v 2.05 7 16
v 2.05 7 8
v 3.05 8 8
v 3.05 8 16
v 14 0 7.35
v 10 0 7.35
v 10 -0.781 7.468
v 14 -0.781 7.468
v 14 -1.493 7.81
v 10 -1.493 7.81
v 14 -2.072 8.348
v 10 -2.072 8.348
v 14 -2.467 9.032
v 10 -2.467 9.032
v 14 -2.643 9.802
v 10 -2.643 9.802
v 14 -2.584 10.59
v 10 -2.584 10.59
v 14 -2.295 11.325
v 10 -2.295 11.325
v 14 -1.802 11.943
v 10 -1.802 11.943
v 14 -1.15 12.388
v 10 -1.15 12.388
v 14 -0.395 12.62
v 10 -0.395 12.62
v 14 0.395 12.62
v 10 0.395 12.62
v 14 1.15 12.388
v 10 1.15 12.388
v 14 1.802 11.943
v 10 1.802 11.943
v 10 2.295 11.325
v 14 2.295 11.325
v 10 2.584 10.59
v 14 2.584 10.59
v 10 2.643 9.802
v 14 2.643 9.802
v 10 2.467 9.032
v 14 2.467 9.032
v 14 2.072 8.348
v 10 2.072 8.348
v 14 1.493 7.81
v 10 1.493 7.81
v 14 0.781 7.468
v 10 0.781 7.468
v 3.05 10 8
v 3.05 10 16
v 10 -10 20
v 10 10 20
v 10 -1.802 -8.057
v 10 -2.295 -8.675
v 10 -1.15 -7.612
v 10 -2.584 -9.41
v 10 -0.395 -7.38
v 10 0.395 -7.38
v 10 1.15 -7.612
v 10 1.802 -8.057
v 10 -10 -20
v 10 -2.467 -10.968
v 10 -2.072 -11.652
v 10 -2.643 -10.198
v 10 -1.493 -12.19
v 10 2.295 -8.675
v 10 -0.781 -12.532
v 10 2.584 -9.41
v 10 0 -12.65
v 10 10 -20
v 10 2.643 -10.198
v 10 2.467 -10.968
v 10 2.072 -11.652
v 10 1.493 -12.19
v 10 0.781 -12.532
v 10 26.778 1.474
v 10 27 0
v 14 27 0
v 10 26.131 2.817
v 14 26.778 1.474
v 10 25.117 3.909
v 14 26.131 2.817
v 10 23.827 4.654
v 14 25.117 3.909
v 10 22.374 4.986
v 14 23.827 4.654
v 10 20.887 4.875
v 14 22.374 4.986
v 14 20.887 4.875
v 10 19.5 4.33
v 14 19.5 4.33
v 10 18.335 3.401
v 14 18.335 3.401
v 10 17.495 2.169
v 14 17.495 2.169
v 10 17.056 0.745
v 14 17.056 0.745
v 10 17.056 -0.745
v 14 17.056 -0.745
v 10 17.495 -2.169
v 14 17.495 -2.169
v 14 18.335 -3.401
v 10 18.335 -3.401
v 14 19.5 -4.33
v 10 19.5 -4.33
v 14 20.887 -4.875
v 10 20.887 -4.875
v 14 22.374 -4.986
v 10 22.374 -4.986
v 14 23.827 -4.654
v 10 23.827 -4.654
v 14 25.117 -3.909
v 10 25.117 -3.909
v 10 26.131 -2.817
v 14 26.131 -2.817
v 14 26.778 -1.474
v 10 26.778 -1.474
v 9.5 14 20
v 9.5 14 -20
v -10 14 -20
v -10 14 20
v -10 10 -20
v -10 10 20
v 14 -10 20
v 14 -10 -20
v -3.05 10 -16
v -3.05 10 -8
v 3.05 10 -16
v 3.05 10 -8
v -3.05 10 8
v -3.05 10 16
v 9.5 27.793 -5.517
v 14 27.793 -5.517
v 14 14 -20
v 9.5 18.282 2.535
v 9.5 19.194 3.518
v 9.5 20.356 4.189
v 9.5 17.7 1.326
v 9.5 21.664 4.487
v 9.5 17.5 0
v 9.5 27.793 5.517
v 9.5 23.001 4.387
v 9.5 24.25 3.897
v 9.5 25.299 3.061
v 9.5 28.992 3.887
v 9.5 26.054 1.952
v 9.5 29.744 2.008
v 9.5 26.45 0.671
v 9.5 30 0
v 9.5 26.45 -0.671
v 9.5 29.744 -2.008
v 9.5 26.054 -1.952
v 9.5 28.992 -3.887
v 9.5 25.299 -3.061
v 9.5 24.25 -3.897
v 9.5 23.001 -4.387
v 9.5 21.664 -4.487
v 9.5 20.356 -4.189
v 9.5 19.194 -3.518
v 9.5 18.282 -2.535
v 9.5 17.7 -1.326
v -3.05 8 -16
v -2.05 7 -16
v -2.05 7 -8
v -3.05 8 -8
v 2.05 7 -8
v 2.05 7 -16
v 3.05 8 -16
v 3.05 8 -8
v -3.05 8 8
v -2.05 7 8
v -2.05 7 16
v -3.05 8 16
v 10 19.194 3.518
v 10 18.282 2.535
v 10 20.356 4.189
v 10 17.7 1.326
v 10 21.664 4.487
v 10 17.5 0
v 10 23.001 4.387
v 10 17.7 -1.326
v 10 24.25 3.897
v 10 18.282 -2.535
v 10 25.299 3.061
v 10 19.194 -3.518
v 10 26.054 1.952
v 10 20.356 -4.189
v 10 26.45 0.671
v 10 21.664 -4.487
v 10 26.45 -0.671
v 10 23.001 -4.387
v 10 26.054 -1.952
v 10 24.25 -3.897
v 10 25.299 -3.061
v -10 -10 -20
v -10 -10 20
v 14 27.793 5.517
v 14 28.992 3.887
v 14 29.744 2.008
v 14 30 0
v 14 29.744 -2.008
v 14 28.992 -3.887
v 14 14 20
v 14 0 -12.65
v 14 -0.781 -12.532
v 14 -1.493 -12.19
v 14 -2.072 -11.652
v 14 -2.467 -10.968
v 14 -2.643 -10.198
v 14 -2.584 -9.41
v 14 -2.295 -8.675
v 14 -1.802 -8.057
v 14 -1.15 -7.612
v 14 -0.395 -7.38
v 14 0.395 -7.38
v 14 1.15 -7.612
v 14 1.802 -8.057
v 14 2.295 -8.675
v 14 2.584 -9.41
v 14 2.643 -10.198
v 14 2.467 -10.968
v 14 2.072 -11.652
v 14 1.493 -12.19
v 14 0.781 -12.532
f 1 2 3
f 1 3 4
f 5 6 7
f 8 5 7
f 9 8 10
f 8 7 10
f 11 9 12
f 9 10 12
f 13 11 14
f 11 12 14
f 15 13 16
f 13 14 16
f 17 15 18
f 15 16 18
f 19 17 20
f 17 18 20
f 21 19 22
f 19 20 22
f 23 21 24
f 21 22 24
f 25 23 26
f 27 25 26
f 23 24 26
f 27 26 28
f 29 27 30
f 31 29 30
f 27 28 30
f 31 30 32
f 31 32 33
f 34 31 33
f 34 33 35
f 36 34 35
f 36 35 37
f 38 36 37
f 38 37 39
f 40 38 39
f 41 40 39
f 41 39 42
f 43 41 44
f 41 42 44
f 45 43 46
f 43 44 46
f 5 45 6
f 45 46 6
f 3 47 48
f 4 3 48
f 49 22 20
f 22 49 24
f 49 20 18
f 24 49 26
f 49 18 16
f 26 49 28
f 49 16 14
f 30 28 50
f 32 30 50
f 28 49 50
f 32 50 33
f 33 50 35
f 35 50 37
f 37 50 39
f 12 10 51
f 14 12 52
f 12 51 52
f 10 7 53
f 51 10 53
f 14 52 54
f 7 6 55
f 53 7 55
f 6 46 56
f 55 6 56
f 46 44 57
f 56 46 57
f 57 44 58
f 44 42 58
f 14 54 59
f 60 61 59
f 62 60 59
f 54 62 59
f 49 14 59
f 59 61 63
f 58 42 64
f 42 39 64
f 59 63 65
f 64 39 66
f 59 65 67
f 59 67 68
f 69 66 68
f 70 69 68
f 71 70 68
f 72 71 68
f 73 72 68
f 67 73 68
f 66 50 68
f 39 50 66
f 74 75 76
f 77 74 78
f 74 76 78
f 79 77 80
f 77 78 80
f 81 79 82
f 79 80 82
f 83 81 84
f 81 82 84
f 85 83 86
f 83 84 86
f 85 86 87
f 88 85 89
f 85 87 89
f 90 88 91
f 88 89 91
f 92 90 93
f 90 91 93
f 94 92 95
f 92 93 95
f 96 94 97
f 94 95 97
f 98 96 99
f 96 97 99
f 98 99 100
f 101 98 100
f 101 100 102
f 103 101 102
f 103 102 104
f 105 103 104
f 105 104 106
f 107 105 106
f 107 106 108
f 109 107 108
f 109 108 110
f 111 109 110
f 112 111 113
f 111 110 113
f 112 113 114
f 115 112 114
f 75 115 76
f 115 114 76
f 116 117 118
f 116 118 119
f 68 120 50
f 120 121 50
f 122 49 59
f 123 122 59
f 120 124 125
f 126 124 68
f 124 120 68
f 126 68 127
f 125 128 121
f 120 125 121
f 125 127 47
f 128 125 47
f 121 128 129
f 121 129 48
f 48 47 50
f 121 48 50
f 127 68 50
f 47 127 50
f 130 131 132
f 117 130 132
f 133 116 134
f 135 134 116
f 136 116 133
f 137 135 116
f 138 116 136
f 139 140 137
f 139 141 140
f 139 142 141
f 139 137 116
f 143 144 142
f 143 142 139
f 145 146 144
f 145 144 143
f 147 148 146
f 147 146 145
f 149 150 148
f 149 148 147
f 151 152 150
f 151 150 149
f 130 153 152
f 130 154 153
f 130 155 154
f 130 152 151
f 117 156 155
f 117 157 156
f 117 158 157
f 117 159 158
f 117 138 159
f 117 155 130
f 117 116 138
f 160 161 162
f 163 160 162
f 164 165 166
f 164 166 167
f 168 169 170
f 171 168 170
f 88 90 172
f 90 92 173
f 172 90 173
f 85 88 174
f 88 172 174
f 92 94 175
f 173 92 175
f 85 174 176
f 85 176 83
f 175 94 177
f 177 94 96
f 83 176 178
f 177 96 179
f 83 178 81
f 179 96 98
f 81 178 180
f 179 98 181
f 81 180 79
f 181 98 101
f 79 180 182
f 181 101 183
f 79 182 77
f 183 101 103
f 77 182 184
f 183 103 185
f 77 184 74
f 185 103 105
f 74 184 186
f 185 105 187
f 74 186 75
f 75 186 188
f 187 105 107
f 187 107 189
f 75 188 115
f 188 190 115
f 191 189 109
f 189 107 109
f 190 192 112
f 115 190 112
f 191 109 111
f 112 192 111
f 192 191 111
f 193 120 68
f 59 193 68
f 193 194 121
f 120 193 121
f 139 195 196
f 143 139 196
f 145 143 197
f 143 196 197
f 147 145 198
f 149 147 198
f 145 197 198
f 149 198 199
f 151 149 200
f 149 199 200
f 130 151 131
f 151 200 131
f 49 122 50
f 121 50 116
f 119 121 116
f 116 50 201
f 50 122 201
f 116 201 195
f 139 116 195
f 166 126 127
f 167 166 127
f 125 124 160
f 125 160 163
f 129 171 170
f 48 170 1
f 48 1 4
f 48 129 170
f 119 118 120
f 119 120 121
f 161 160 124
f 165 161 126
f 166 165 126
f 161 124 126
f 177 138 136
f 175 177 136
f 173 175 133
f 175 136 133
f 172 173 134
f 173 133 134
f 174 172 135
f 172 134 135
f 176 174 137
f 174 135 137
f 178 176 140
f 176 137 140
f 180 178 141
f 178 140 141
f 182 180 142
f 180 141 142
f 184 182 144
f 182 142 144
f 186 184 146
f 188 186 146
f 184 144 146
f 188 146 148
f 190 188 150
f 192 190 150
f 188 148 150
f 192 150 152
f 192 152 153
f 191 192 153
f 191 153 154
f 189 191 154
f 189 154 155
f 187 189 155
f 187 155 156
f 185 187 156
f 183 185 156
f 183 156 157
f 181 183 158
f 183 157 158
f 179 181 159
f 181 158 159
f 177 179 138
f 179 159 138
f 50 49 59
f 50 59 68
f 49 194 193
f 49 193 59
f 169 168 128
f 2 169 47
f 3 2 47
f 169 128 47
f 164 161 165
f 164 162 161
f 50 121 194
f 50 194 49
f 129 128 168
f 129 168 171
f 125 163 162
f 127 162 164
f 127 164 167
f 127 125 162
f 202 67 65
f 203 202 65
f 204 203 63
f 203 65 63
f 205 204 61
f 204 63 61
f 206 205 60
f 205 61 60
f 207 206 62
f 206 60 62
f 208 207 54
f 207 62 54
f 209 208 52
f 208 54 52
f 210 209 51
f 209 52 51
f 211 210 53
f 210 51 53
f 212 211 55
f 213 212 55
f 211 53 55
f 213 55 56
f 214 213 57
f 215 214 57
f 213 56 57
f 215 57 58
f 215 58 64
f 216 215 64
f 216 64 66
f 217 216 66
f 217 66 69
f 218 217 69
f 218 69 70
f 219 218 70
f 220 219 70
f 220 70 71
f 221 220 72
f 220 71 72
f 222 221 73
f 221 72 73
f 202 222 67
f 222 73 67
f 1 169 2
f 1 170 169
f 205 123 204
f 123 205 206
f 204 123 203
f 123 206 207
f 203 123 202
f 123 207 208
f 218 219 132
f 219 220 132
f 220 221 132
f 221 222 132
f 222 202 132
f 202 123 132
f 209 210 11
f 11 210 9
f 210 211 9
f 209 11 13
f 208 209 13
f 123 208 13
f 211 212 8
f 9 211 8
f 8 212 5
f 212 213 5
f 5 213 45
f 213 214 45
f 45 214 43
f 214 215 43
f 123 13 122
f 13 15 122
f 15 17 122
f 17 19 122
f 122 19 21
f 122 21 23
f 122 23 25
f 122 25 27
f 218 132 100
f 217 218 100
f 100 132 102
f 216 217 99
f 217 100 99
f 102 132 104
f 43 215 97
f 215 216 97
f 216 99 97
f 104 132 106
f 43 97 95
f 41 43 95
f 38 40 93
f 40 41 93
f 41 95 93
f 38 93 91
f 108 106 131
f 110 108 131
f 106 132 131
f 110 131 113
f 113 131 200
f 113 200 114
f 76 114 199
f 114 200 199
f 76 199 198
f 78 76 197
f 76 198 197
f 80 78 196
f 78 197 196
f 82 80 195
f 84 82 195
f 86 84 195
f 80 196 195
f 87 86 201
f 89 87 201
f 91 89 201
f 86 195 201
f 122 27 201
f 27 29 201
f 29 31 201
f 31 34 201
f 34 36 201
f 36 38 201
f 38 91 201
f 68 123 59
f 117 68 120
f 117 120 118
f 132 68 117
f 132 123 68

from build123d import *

# Parameters (mm, degrees)
SKETCH_2_W                 = 20
SKETCH_2_H                 = 20
EXTRUDE_1_DEPTH            = 20
SKETCH_3_W                 = 40
SKETCH_3_H                 = 24
EXTRUDE_2_DEPTH            = 4
SKETCH_5_W                 = 2.65
SKETCH_5_H                 = 24
HOLE_WIZARD_M51_AT_2_COUNT = 2
HOLE_WIZARD_M51_AT_2_PITCH = 20
SKETCH_6_W                 = 40
SKETCH_6_H                 = 4
EXTRUDE_3_DEPTH            = 20
SKETCH_7_W                 = 6.1
SKETCH_7_H                 = 8
EXTRUDE_4_DEPTH            = 3
CHAMFER_1_SIZE             = 1
SKETCH_8_R                 = 5
EXTRUDE_5_DEPTH            = 4.5
SKETCH_9_R                 = 5
SKETCH_9_R_2               = 4.5
EXTRUDE_6_DEPTH            = 0.5


with BuildPart() as part:
    # Эскиз2 → Бобышка-Вытянуть1 (new, symmetric)
    with BuildSketch(Plane.XY):
        Rectangle(SKETCH_2_W, SKETCH_2_H)
    extrude(amount=EXTRUDE_1_DEPTH, both=True)


with BuildPart() as body_2:
    # Эскиз3 → Бобышка-Вытянуть2 (new body)
    with BuildSketch(Plane(origin=(10, 0, 0), x_dir=(0, 0, -1), z_dir=(1, 0, 0))):
        with Locations((0, 2)):
            Rectangle(SKETCH_3_W, SKETCH_3_H)
    extrude(amount=EXTRUDE_2_DEPTH)

    # Эскиз5 → Отверстие с зазором M51 (revolve, cut)
    with BuildSketch(Plane(origin=(14, 0, 10), x_dir=(0, 0, -1), z_dir=(0, 1, 0))):
        with Locations((1.325, 12)):
            Rectangle(SKETCH_5_W, SKETCH_5_H)
    hole_wizard_m51 = revolve(axis=Axis((20.35, 0, 10), (-1, 0, 0)), mode=Mode.SUBTRACT)

    # Отверстие с зазором M51 at 2: Отверстие с зазором M51 ×2
    with Locations(*[(0, 0, -i * HOLE_WIZARD_M51_AT_2_PITCH) for i in range(1, HOLE_WIZARD_M51_AT_2_COUNT)]):
        add(hole_wizard_m51, mode=Mode.SUBTRACT)

    # Эскиз6 → Бобышка-Вытянуть3 (add)
    with BuildSketch(Plane.ZY.offset(-10)):
        with Locations((0, 12)):
            Rectangle(SKETCH_6_W, SKETCH_6_H)
    extrude(amount=EXTRUDE_3_DEPTH)

    # Эскиз7 → Бобышка-Вытянуть4 (add)
    with BuildSketch(Plane.XZ.offset(-10)):
        with Locations((0, 12)):
            Rectangle(SKETCH_7_W, SKETCH_7_H)
        with Locations((0, -12)):
            Rectangle(SKETCH_7_W, SKETCH_7_H)
    extrude(amount=EXTRUDE_4_DEPTH)

    # Фаска1
    chamfer_1_edges = [body_2.edges().sort_by_distance(p)[0] for p in [
        (-3.05, 7, 12),
        (3.05, 7, 12),
        (-3.05, 7, -12),
        (3.05, 7, -12),
    ]]
    chamfer(chamfer_1_edges, length=CHAMFER_1_SIZE)

    # Эскиз8 → Бобышка-Вытянуть5 (add)
    with BuildSketch(Plane(origin=(14, 0, 0), x_dir=(0, 0, -1), z_dir=(1, 0, 0))):
        with BuildLine():
            ThreePointArc((-5.517241379, 27.793103448), (0, 30), (5.517241379, 27.793103448))
            Line((5.517241379, 27.793103448), (20, 14))
            Line((20, 14), (-20, 14))
            Line((-20, 14), (-5.517241379, 27.793103448))
        make_face()
        with Locations(Location((0, 22, 0), (0, 0, 90))):
            Circle(SKETCH_8_R, mode=Mode.SUBTRACT)
    extrude(amount=-EXTRUDE_5_DEPTH)

    # Эскиз9 → Бобышка-Вытянуть6 (add)
    with BuildSketch(Plane.ZY.offset(-9.5)):
        with Locations(Location((0, 22, 0), (0, 0, 90))):
            Circle(SKETCH_9_R)
        with Locations(Location((0, 22, 0), (0, 0, 270))):
            Circle(SKETCH_9_R_2, mode=Mode.SUBTRACT)
    extrude(amount=-EXTRUDE_6_DEPTH)


solid = Compound([part.part, body_2.part])
